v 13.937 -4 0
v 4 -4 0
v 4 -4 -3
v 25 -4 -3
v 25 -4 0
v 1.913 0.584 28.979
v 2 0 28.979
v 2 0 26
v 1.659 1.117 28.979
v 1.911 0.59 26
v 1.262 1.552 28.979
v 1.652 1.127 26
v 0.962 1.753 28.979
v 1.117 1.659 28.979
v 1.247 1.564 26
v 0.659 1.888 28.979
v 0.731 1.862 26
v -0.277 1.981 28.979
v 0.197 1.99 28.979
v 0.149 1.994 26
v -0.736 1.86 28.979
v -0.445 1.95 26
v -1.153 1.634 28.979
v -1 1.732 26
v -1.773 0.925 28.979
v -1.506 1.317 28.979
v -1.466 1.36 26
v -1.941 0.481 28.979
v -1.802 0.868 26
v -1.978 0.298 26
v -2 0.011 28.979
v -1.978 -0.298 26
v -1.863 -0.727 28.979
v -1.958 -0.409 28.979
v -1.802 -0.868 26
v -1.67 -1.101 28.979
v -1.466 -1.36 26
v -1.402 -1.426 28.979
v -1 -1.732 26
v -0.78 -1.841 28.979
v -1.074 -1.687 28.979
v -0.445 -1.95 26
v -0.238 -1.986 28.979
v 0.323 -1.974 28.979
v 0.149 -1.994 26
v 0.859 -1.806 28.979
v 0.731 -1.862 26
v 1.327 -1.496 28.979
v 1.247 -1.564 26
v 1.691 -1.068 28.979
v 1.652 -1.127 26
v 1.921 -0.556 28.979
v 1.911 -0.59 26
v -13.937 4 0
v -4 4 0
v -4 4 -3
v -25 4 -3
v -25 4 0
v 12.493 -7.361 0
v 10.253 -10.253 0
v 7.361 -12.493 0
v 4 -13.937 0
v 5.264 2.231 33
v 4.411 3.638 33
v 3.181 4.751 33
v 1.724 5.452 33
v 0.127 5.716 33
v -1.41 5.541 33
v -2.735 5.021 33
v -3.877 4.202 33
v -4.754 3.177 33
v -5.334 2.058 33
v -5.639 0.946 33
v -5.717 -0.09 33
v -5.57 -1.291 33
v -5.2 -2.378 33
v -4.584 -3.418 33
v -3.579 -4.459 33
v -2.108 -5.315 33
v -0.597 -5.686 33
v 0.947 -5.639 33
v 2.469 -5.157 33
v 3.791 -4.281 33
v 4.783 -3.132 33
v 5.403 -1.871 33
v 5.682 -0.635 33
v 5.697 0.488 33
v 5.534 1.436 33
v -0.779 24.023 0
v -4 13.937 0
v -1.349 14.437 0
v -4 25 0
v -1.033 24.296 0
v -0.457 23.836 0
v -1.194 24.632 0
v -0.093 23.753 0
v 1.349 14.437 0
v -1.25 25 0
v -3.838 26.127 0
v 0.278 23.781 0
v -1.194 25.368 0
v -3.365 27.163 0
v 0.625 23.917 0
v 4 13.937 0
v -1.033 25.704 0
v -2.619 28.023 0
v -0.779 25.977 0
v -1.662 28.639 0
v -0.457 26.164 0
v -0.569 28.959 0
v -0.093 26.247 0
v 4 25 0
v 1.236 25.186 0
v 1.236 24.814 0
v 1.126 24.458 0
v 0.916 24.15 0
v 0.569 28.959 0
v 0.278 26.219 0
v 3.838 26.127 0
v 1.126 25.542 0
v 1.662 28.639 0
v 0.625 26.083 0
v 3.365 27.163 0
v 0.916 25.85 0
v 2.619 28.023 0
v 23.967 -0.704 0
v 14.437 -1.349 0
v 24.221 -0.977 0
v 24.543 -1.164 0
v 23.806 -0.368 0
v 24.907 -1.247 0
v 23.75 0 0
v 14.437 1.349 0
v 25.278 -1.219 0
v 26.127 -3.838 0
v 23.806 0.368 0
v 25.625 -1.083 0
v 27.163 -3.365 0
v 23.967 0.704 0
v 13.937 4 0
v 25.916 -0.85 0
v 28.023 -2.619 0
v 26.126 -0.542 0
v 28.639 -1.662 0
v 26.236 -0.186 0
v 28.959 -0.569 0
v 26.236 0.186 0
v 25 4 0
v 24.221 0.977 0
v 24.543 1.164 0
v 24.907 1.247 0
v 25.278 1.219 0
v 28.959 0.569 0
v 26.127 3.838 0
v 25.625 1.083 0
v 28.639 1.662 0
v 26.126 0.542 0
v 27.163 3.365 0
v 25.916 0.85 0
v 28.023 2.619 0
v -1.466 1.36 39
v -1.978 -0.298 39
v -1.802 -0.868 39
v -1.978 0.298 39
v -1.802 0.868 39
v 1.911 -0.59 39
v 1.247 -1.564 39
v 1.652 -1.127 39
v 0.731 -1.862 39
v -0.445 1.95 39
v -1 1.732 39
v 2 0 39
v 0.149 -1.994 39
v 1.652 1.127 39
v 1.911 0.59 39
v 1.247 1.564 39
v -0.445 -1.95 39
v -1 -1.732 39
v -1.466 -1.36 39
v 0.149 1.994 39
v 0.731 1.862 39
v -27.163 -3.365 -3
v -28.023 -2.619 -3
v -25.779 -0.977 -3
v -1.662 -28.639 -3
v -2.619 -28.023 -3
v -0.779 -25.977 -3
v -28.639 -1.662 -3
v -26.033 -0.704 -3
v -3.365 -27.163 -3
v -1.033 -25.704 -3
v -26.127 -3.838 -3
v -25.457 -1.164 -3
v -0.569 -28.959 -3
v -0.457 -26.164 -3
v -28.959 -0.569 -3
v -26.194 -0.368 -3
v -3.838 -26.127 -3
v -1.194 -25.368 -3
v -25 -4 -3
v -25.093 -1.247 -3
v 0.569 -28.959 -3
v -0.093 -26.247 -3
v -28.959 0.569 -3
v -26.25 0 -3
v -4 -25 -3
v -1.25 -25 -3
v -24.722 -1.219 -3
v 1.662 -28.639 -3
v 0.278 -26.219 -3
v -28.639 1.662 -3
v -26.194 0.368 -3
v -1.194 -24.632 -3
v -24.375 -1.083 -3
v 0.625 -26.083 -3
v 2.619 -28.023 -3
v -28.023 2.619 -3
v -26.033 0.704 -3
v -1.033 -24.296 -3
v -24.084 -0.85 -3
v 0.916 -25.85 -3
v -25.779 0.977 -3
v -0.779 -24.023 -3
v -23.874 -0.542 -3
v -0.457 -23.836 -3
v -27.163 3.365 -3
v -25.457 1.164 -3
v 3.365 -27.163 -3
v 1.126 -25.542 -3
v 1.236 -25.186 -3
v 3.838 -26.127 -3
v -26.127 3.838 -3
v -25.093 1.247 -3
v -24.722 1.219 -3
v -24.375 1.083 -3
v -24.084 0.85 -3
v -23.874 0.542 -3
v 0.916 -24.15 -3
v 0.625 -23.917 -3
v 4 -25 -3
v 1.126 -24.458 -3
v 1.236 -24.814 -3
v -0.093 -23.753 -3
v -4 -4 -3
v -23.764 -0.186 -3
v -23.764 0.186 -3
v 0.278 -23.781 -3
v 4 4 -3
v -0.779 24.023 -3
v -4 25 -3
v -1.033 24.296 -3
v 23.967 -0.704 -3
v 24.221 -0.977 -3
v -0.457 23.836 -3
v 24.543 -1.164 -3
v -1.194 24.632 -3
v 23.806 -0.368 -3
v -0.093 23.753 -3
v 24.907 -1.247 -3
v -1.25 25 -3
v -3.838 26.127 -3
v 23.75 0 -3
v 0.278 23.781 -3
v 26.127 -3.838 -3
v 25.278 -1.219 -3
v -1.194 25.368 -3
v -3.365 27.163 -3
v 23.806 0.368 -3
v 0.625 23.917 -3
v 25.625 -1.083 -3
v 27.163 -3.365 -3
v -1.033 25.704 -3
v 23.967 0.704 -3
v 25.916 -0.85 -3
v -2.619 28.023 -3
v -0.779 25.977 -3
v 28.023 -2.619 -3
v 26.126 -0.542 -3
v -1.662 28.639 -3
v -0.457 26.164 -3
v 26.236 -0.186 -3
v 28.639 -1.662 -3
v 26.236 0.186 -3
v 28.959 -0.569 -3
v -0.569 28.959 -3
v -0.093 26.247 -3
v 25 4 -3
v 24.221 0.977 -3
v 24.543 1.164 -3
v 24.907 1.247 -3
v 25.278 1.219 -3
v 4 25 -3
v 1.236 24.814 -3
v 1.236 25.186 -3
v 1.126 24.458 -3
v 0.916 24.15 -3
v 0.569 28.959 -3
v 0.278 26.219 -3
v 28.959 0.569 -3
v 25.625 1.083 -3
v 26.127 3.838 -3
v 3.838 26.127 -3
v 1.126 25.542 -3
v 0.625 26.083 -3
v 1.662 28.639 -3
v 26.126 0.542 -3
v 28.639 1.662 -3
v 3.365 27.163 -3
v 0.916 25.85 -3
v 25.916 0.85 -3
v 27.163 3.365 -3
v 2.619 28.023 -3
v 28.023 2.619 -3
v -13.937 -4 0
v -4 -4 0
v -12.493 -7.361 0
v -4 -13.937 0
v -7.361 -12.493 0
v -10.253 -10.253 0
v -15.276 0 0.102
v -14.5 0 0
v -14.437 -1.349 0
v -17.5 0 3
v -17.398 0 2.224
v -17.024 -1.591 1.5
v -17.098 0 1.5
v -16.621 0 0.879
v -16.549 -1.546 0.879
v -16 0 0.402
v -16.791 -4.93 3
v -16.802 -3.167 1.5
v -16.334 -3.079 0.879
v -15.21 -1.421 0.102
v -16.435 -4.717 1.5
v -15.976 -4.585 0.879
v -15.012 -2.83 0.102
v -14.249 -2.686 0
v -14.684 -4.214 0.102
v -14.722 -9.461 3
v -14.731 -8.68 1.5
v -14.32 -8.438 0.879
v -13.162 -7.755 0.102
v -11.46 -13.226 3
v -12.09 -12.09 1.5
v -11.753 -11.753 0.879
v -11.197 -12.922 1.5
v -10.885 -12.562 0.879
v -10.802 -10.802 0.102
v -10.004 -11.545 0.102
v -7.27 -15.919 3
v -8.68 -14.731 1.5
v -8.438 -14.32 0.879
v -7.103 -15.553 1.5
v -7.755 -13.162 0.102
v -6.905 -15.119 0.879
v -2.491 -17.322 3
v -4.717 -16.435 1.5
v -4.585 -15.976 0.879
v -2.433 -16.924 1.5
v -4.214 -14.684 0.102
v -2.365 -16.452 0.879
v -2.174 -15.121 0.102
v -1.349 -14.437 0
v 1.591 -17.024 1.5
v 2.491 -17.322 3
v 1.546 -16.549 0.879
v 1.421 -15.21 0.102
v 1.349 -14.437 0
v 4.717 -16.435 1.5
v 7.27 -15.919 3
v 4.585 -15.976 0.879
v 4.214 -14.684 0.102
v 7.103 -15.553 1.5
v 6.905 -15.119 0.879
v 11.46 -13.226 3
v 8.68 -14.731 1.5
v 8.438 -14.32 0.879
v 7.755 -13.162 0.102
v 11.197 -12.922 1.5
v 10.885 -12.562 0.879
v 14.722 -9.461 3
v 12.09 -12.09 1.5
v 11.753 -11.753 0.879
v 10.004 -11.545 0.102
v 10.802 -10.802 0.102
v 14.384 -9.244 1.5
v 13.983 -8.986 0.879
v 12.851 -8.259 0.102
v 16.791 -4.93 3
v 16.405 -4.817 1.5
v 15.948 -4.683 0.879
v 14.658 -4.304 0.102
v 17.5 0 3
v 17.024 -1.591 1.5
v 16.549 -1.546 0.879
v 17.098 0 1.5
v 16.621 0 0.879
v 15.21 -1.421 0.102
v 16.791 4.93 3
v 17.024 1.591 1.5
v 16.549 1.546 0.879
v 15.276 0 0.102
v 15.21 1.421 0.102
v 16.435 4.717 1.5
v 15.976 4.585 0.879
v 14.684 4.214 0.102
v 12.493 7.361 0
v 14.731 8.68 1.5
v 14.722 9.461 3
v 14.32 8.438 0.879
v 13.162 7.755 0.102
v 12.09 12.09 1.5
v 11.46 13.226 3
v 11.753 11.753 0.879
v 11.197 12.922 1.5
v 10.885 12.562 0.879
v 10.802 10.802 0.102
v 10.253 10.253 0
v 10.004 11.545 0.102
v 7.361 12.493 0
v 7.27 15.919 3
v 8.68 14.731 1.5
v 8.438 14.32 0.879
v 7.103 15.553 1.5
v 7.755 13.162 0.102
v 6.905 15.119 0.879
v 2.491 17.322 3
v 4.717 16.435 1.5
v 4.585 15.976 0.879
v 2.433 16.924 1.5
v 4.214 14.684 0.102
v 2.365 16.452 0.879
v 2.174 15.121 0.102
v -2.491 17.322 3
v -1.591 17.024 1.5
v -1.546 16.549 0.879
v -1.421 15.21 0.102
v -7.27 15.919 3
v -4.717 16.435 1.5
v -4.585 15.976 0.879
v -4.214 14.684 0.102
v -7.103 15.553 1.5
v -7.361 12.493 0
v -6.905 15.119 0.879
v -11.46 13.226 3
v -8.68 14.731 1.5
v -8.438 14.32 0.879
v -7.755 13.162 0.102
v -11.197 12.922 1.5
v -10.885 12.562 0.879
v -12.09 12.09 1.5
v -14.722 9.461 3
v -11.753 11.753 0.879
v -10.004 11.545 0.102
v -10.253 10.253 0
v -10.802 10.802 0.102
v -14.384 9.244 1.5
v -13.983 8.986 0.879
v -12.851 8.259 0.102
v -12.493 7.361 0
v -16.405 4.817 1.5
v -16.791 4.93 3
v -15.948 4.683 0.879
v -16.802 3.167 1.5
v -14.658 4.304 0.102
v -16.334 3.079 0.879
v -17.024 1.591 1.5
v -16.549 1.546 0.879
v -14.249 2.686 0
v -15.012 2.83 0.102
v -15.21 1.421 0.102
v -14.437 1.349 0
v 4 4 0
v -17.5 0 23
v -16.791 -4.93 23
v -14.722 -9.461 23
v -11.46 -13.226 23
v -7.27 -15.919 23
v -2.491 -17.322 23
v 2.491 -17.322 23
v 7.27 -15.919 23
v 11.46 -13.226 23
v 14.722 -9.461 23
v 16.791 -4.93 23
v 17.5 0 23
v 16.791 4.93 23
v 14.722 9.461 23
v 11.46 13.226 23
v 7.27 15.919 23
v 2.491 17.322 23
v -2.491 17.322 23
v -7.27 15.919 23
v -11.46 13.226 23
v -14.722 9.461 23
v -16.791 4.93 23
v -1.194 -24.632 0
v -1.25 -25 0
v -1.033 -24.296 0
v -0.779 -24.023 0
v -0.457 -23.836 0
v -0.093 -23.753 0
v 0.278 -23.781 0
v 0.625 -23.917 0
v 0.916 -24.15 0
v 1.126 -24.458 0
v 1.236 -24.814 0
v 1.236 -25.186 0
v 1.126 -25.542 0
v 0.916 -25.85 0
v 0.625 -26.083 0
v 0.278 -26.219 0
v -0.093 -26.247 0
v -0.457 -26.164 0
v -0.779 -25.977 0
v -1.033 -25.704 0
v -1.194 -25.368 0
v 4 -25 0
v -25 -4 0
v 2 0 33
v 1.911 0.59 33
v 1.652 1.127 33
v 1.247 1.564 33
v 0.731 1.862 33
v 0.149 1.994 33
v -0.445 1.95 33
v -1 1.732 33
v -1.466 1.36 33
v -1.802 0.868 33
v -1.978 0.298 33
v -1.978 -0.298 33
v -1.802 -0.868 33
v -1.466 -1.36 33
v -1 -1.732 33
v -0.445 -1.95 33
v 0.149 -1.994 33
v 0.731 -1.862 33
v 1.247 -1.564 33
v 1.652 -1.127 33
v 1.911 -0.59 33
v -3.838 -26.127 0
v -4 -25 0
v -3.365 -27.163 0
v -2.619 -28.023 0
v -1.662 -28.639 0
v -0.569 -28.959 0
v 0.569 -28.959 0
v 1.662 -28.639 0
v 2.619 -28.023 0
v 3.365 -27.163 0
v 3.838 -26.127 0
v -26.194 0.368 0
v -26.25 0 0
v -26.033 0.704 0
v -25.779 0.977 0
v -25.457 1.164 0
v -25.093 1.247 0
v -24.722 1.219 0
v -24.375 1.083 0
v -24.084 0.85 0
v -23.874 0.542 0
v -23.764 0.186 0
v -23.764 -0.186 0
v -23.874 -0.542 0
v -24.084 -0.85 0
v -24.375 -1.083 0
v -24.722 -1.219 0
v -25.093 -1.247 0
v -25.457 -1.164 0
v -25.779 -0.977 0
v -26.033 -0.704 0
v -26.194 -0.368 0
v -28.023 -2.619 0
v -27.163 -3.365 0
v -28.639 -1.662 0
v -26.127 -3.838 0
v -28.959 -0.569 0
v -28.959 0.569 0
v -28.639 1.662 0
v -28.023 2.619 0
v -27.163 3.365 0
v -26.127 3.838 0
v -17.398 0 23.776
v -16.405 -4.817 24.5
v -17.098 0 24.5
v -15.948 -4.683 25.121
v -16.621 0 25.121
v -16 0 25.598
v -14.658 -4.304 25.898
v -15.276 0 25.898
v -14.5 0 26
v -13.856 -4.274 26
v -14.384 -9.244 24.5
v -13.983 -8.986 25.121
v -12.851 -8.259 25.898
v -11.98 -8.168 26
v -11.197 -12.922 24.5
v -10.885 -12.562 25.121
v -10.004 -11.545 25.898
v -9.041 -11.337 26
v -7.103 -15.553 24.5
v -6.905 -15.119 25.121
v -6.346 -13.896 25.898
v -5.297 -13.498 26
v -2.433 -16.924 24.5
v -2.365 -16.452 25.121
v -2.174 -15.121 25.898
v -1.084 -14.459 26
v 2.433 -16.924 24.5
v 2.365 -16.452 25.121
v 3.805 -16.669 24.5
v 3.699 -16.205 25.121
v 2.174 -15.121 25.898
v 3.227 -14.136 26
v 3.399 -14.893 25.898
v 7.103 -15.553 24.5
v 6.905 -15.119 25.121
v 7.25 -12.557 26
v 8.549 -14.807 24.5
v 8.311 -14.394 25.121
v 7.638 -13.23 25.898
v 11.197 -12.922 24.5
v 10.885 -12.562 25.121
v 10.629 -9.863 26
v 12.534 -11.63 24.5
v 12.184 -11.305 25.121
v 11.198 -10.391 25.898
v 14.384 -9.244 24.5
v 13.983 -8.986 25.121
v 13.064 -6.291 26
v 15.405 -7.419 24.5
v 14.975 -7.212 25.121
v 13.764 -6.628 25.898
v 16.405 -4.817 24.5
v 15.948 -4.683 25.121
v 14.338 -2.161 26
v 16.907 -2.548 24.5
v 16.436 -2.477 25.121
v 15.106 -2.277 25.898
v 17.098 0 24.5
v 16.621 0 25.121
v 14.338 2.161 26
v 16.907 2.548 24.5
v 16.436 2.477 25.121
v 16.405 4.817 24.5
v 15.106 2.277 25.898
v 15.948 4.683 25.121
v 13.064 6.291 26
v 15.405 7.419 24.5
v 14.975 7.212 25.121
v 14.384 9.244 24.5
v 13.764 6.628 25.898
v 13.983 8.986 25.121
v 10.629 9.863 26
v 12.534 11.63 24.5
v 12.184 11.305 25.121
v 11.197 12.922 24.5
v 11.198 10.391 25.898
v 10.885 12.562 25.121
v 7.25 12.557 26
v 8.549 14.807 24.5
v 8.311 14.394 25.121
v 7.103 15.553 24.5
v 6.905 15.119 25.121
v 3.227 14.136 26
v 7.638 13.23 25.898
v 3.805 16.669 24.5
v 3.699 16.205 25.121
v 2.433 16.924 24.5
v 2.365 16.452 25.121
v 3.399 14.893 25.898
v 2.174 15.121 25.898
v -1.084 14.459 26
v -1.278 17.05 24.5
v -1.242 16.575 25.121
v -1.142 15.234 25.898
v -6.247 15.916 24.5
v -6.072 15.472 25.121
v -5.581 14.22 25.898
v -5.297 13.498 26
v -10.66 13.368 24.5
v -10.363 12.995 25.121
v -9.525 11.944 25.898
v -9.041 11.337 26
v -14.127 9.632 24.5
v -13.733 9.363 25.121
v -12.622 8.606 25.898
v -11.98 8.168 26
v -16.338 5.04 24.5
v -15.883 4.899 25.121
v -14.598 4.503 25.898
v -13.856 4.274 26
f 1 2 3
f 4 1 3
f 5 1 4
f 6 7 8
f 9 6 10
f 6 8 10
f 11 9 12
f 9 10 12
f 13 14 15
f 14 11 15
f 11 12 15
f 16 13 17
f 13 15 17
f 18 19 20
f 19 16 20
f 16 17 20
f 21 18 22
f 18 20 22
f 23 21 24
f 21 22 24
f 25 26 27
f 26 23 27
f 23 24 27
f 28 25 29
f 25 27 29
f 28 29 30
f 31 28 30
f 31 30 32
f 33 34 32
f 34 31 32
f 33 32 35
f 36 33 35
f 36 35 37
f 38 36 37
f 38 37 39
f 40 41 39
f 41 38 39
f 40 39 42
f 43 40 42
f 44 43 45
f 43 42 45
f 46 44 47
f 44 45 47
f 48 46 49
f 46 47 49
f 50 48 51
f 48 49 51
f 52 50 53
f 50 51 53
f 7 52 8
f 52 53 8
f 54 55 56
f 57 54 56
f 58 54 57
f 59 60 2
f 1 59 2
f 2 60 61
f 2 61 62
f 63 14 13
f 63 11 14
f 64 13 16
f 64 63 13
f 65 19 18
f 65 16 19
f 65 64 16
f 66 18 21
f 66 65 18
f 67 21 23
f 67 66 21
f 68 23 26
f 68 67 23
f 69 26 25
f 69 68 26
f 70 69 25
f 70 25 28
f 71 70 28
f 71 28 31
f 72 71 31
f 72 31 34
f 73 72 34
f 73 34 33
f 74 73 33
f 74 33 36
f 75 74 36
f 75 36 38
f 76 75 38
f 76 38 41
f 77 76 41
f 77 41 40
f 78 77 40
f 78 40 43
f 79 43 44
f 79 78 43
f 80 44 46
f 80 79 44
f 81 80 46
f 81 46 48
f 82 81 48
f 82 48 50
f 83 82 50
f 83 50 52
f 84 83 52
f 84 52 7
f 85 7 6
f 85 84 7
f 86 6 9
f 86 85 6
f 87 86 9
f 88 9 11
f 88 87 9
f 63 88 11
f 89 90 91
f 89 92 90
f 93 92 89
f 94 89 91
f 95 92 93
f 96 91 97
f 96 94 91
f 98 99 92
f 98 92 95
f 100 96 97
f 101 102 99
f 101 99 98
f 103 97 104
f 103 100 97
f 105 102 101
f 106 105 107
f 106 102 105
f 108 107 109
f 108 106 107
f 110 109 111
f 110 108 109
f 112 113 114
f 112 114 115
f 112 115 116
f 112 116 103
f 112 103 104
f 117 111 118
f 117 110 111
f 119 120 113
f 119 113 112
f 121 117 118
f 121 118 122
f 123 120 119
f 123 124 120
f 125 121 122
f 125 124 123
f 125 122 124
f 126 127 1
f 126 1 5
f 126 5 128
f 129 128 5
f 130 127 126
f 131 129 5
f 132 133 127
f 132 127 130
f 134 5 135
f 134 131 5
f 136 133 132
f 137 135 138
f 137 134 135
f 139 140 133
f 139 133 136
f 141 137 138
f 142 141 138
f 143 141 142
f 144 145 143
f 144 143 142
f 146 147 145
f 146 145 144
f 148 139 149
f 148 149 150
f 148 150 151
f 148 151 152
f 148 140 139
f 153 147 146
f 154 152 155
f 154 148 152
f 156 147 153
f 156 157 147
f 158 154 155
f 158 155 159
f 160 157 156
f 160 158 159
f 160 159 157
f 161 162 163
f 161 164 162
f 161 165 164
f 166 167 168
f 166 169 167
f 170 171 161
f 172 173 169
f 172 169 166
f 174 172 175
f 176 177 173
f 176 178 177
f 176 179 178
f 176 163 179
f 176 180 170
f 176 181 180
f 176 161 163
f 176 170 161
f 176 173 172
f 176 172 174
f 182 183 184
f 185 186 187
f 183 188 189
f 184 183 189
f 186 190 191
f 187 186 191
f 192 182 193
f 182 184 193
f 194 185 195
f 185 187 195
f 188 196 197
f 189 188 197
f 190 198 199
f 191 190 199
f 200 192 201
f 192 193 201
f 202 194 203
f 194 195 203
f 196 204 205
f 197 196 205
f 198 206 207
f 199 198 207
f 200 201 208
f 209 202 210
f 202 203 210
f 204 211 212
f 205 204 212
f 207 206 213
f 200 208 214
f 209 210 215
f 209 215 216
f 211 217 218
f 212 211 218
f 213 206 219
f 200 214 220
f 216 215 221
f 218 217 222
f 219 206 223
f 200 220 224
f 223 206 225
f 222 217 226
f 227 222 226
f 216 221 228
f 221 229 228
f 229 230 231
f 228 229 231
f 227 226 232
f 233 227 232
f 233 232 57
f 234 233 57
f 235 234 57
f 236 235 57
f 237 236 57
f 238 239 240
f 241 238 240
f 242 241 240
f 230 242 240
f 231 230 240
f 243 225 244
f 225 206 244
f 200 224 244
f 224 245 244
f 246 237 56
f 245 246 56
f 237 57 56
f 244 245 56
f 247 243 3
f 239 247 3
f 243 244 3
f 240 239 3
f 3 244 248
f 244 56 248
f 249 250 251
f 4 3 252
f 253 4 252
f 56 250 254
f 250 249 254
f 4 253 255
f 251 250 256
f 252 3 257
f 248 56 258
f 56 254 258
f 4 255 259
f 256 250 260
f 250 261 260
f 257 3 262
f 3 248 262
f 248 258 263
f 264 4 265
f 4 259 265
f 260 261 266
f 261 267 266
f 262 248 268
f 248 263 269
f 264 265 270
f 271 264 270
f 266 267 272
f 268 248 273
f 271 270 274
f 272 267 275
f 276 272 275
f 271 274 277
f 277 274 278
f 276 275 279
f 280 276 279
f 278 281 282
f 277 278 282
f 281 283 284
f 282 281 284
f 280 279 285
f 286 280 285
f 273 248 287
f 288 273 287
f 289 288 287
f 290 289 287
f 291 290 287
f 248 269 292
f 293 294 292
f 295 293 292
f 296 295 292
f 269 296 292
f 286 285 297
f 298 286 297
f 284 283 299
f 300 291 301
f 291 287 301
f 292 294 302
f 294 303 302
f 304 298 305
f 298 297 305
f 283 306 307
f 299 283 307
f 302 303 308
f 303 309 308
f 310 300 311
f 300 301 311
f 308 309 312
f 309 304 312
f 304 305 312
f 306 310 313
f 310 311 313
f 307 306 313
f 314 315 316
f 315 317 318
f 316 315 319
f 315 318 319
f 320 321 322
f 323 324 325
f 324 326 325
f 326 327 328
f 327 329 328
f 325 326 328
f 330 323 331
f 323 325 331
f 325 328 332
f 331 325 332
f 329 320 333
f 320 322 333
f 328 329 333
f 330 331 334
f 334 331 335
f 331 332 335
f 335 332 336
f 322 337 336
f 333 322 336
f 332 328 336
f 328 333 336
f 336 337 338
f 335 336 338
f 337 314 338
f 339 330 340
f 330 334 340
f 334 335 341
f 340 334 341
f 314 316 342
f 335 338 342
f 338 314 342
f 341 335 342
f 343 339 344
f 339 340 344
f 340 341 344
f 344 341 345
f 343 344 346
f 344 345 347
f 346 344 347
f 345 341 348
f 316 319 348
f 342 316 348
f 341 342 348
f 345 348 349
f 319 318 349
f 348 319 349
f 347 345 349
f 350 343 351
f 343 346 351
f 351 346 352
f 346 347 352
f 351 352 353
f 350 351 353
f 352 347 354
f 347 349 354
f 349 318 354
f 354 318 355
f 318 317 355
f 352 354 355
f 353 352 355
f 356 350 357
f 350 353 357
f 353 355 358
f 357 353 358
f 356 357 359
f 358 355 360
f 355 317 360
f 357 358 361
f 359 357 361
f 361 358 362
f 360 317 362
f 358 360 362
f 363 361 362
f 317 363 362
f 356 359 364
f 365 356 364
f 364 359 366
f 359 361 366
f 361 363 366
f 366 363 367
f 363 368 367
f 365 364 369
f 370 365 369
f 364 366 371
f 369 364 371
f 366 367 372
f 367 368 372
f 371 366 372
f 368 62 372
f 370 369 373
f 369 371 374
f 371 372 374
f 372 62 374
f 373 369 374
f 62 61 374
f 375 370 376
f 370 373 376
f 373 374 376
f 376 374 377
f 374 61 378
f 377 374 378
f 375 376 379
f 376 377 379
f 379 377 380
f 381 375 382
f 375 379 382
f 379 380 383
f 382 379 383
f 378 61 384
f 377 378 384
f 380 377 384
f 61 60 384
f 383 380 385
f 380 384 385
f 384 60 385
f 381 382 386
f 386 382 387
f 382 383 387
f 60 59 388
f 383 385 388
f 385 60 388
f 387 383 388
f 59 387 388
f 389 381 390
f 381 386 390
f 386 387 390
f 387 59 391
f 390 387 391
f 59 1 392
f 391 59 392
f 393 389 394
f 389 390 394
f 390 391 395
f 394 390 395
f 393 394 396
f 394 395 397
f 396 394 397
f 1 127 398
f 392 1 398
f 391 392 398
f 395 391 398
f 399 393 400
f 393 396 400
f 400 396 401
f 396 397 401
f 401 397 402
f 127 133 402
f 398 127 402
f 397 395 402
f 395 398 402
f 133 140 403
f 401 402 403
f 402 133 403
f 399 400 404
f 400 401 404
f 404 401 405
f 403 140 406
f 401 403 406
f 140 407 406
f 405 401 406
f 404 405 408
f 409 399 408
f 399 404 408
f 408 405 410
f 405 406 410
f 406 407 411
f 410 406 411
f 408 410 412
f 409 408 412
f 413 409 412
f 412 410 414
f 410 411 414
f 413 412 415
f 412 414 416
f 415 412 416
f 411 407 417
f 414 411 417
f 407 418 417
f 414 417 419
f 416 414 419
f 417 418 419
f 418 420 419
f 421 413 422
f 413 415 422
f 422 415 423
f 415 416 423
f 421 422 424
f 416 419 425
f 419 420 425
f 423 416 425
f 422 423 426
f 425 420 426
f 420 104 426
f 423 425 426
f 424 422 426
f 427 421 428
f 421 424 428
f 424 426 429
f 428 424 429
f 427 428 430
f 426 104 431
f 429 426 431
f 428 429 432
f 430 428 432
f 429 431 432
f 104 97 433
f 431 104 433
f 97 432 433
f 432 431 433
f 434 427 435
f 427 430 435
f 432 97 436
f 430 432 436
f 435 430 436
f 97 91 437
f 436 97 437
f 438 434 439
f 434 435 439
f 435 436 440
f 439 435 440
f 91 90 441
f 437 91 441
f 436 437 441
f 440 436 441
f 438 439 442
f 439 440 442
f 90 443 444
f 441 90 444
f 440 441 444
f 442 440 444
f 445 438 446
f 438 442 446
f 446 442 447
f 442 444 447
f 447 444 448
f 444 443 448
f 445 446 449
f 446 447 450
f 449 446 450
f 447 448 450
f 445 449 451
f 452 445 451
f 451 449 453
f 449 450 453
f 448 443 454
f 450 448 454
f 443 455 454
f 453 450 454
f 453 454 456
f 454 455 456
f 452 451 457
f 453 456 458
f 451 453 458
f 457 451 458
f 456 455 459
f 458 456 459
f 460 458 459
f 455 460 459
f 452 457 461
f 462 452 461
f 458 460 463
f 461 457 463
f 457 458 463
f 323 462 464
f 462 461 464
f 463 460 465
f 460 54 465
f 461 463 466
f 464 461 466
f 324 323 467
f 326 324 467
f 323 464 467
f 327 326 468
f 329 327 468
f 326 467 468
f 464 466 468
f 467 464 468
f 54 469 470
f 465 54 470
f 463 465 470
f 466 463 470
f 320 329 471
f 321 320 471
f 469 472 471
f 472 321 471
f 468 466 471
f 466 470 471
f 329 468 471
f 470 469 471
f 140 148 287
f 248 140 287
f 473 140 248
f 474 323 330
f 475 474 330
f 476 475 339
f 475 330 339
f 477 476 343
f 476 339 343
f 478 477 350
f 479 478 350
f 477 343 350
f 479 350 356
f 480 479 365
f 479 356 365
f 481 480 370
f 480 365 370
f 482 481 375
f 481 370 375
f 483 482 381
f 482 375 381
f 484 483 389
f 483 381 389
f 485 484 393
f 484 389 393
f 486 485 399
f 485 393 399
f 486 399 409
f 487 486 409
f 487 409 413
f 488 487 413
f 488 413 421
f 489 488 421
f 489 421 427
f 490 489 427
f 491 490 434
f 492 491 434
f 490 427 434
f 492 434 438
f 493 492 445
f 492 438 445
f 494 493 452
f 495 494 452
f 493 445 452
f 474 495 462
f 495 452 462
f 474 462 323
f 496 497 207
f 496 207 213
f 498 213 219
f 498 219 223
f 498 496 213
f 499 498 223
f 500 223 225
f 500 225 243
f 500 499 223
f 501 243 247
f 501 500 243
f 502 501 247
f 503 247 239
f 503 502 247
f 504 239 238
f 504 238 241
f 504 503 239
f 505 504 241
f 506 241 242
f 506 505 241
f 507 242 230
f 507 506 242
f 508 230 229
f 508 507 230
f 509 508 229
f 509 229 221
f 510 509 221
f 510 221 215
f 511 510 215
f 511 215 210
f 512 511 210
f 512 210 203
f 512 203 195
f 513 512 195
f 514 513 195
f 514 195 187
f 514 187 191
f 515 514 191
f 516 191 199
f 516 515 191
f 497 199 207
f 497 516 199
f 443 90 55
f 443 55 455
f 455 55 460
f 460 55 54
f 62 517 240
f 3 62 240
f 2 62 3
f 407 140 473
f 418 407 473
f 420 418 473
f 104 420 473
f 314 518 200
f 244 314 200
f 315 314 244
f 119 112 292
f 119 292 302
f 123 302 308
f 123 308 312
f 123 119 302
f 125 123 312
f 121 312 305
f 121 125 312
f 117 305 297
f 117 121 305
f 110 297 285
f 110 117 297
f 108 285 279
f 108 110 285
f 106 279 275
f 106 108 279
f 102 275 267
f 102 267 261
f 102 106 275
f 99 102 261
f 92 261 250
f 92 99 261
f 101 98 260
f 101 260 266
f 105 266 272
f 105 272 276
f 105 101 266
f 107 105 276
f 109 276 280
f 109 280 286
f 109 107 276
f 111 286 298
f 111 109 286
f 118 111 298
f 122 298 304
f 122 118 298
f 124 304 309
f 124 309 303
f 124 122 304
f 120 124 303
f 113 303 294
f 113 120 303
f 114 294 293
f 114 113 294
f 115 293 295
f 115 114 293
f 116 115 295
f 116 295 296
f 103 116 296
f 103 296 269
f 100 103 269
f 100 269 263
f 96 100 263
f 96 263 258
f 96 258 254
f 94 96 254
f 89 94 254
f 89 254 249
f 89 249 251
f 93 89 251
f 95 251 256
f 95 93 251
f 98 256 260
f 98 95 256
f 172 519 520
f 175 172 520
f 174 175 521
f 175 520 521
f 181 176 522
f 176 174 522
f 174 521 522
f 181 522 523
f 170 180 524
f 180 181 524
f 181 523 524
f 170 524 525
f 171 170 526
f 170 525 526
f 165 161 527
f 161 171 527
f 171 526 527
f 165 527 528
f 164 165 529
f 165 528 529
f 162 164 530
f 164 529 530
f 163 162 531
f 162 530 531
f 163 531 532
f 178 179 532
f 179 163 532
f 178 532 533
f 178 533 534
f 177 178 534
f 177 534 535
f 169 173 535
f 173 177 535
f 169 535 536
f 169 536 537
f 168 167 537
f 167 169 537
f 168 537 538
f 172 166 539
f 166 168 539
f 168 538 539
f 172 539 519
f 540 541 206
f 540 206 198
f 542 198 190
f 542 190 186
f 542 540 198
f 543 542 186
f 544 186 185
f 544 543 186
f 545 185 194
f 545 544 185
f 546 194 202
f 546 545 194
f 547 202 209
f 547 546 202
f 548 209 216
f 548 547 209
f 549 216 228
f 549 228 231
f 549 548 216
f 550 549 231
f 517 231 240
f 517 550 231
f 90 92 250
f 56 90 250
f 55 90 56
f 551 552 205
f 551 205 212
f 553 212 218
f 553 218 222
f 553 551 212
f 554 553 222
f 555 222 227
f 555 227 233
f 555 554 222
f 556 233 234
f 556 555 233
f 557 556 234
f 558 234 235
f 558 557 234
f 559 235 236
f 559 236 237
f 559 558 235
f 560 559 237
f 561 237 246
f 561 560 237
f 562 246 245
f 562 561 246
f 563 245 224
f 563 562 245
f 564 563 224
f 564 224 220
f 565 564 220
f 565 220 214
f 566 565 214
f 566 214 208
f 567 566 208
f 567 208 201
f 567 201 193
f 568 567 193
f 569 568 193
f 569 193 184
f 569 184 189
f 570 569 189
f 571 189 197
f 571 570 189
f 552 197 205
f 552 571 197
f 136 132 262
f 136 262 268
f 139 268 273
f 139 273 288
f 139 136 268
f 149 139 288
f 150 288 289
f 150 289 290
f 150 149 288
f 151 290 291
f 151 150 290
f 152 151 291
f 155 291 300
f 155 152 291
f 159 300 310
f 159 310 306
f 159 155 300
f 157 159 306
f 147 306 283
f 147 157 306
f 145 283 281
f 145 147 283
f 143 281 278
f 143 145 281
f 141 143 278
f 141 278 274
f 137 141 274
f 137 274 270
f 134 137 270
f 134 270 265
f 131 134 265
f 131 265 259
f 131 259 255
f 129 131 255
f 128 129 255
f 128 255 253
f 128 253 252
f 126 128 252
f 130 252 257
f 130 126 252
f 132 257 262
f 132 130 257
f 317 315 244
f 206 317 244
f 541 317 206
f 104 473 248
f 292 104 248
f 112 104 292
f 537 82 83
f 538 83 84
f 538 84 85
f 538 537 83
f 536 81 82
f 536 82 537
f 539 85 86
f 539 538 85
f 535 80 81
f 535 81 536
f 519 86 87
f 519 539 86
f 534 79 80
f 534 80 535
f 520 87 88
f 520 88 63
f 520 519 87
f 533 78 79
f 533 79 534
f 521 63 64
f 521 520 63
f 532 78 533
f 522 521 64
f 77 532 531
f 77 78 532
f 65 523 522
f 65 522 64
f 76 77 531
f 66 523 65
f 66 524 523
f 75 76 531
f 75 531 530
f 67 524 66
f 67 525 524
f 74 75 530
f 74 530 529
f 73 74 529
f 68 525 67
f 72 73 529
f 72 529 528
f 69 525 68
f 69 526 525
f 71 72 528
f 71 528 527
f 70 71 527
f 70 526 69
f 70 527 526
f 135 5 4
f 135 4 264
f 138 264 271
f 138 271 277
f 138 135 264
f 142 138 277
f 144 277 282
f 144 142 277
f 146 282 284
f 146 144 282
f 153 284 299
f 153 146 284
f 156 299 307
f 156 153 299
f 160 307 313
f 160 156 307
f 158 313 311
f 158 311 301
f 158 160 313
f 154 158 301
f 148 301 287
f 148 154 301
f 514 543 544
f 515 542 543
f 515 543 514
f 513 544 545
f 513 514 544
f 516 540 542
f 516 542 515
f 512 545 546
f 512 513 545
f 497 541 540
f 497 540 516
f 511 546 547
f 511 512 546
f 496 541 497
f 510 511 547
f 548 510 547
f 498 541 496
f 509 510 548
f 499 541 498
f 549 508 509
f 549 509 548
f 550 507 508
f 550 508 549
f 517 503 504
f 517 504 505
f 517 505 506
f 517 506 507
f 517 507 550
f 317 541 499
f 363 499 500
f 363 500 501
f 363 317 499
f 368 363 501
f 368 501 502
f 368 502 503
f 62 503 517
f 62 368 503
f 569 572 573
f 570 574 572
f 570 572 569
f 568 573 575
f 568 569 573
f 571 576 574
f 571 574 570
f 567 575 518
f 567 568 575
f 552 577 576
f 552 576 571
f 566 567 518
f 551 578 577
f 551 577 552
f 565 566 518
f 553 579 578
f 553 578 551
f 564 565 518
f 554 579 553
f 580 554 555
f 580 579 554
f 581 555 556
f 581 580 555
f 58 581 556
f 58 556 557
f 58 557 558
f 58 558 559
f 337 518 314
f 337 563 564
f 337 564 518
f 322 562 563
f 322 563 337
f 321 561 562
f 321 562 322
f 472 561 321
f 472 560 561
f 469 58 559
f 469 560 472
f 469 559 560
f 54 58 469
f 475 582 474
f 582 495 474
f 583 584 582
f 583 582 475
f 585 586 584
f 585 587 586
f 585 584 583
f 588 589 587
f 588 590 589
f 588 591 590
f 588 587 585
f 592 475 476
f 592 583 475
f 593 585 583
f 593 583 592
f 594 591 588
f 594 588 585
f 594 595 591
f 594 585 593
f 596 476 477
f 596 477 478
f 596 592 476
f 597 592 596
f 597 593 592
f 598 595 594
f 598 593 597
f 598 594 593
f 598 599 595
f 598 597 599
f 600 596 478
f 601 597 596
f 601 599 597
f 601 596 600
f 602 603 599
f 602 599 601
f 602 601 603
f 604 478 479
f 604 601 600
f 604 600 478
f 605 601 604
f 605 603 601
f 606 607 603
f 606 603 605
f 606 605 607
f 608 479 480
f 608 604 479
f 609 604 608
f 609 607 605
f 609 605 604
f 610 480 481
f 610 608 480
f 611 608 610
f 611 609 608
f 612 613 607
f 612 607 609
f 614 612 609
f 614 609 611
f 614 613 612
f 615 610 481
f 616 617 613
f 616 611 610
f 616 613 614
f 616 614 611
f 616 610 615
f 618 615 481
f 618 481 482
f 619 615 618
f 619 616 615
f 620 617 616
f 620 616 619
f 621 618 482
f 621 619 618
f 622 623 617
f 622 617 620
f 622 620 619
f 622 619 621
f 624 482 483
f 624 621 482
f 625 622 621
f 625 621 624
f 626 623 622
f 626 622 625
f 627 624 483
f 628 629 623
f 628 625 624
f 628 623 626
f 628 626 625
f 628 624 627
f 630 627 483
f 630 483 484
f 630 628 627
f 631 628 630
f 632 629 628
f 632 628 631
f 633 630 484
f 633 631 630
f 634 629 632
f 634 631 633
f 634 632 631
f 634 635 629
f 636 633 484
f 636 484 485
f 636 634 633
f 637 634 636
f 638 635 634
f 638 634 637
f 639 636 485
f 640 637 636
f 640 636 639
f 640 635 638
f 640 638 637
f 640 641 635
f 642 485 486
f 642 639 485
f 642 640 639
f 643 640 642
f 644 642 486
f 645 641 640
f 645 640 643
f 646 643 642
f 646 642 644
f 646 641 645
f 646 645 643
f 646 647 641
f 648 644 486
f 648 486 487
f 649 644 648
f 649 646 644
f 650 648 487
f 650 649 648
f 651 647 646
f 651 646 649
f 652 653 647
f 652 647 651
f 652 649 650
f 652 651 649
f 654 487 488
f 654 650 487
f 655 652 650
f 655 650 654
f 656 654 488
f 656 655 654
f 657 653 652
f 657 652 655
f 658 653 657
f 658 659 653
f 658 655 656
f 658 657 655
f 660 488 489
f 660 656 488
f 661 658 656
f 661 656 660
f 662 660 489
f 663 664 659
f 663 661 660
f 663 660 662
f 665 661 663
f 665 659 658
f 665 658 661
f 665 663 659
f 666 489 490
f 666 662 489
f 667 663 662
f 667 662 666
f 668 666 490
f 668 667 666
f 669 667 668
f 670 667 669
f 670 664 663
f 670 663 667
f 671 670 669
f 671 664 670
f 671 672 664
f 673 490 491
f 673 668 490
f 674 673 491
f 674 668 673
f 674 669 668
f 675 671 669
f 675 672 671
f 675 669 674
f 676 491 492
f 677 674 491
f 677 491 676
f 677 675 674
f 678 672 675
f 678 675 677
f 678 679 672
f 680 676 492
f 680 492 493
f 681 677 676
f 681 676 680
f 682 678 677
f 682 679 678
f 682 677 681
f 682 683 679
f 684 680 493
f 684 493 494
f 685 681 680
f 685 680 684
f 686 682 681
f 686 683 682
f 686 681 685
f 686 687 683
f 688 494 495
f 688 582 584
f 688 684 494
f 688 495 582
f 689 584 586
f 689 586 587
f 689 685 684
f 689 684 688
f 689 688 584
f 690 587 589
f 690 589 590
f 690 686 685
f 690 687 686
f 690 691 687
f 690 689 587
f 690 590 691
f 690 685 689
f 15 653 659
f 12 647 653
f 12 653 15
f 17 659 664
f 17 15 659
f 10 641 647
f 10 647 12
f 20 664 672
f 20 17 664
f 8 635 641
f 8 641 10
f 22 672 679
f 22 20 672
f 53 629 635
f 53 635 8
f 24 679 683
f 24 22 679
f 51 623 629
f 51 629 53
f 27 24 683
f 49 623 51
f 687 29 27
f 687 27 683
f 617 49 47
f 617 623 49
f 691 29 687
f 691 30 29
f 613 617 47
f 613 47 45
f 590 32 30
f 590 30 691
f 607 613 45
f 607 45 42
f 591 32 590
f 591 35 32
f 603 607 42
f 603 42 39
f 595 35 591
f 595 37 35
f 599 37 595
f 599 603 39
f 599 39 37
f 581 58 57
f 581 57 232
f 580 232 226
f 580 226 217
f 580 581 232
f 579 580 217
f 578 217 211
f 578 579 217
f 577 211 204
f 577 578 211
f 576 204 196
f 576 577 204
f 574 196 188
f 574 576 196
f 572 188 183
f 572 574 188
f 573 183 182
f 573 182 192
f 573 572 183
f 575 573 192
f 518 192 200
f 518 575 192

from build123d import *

# Parameters (mm, degrees)
ESQUISSE1_R             = 17.5
BOSS_EXTRU_1_DEPTH      = 26
CONG_1_R                = 3
ESQUISSE2_R             = 2
BOSS_EXTRU_2_DEPTH      = 20
ESQUISSE3_R             = 2.5
BOSS_EXTRU_3_DEPTH      = 5
CONG_5_R                = 1
ESQUISSE6_R             = 4.037593864
ENL_V_MAT_EXTRU_1_DEPTH = 7
ESQUISSE7_R             = 1.25
BOSS_EXTRU_4_DEPTH      = 3
ESQUISSE9_R             = 1.25
BOSS_EXTRU_5_DEPTH      = 3
ESQUISSE10_R            = 1.25
BOSS_EXTRU_6_DEPTH      = 3
ESQUISSE11_R            = 1.25
BOSS_EXTRU_7_DEPTH      = 3
ESQUISSE12_R            = 7.076094554
ENL_V_MAT_EXTRU_3_DEPTH = 32


with BuildPart() as part:
    # Esquisse1 → Boss.-Extru.1 (new body)
    with BuildSketch(Plane.XY):
        with Locations(Location((0, 0, 0), (0, 0, 180))):
            Circle(ESQUISSE1_R)
    extrude(amount=BOSS_EXTRU_1_DEPTH)

    # Congé1
    cong_1_edges = [part.edges().sort_by_distance(p)[0] for p in [
        (17.5, 0, 0),
        (17.5, 0, 26),
    ]]
    fillet(cong_1_edges, radius=CONG_1_R)

    # Esquisse2 → Boss.-Extru.2 (add)
    with BuildSketch(Plane.XY.offset(26)):
        Circle(ESQUISSE2_R)
    extrude(amount=BOSS_EXTRU_2_DEPTH)

    # Esquisse3 → Boss.-Extru.3 (add)
    with BuildSketch(Plane(origin=(0, 0, 0), x_dir=(-1, 0, 0), z_dir=(0, 0, -1))):
        with Locations(Location((0, 0, 0), (0, 0, 180))):
            Circle(ESQUISSE3_R)
    extrude(amount=BOSS_EXTRU_3_DEPTH)

    # Congé5
    cong_5_edges = [part.edges().sort_by_distance(p)[0] for p in [
        (-2.5, 0, -5),
    ]]
    fillet(cong_5_edges, radius=CONG_5_R)

    # Lissage1: read off the stored shape, not the designer's step
    # Lissage1: loft between two sections, ruled curve by curve
    lissage1_from = [
        Edge.make_bspline([(-1.703307527, 1.048209649, 26), (-3.799726825, -2.358405406, 26), (-0.39311177, -4.454824703, 26), (1.703307527, -1.048209649, 26), (3.799726825, 2.358405406, 26), (0.39311177, 4.454824703, 26), (-1.703307527, 1.048209649, 26)], [0, 0, 0, 0, 0.5, 0.5, 0.5, 1, 1, 1, 1], 3, [1, 0.333333333, 0.333333333, 1, 0.333333333, 0.333333333, 1]),
    ]
    lissage1_to = [
        Edge.make_bspline([(5.264402681, 2.231137224, 33), (0.802128233, 12.759942587, 33), (-9.72667713, 8.297668139, 33), (-5.264402681, -2.231137224, 33), (-0.802128233, -12.759942587, 33), (9.72667713, -8.297668139, 33), (5.264402681, 2.231137224, 33)], [0, 0, 0, 0, 0.5, 0.5, 0.5, 1, 1, 1, 1], 3, [1, 0.333333333, 0.333333333, 1, 0.333333333, 0.333333333, 1]),
    ]
    lissage1 = Solid(Shell([*[Face.make_surface_from_curves(lissage1_from[k], lissage1_to[k]) for k in range(1)], Face(Wire(lissage1_from)), Face(Wire(lissage1_to))]))
    add(lissage1)

    # Esquisse6 → Enlèv. mat.-Extru.1 (cut)
    with BuildSketch(Plane.XY.offset(46)):
        Circle(ESQUISSE6_R)
    extrude(amount=-ENL_V_MAT_EXTRU_1_DEPTH, mode=Mode.SUBTRACT)

    # Esquisse7 → Boss.-Extru.4 (add)
    with BuildSketch(Plane(origin=(0, 0, 0), x_dir=(-1, 0, 0), z_dir=(0, 0, -1))):
        with BuildLine():
            Line((4, 0), (4, -25))
            ThreePointArc((4, -25), (0, -29), (-4, -25))
            Line((-4, -25), (-4, 0))
            ThreePointArc((-4, 0), (0, 4), (4, 0))
        make_face()
        with Locations((0, -25)):
            Circle(ESQUISSE7_R, mode=Mode.SUBTRACT)
    extrude(amount=BOSS_EXTRU_4_DEPTH)

    # Esquisse9 → Boss.-Extru.5 (add)
    with BuildSketch(Plane(origin=(0, 0, 0), x_dir=(-1, 0, 0), z_dir=(0, 0, -1))):
        with BuildLine():
            Line((-4, 0), (-4, 25))
            ThreePointArc((-4, 25), (0, 29), (4, 25))
            Line((4, 25), (4, 0))
            ThreePointArc((4, 0), (0, -4), (-4, 0))
        make_face()
        with Locations((0, 25)):
            Circle(ESQUISSE9_R, mode=Mode.SUBTRACT)
    extrude(amount=BOSS_EXTRU_5_DEPTH)

    # Esquisse10 → Boss.-Extru.6 (add)
    with BuildSketch(Plane(origin=(0, 0, 0), x_dir=(-1, 0, 0), z_dir=(0, 0, -1))):
        with BuildLine():
            Line((0, -4), (-25, -4))
            ThreePointArc((-25, -4), (-29, 0), (-25, 4))
            Line((-25, 4), (0, 4))
            ThreePointArc((0, 4), (4, 0), (0, -4))
        make_face()
        with Locations((-25, 0)):
            Circle(ESQUISSE10_R, mode=Mode.SUBTRACT)
    extrude(amount=BOSS_EXTRU_6_DEPTH)

    # Esquisse11 → Boss.-Extru.7 (add)
    with BuildSketch(Plane(origin=(0, 0, 0), x_dir=(-1, 0, 0), z_dir=(0, 0, -1))):
        with BuildLine():
            Line((0, 4), (25, 4))
            ThreePointArc((25, 4), (29, 0), (25, -4))
            Line((25, -4), (0, -4))
            ThreePointArc((0, -4), (-4, 0), (0, 4))
        make_face()
        with Locations((25, 0)):
            Circle(ESQUISSE11_R, mode=Mode.SUBTRACT)
    extrude(amount=BOSS_EXTRU_7_DEPTH)

    # Esquisse12 → Enlèv. mat.-Extru.3 (cut)
    with BuildSketch(Plane(origin=(0, 0, -3), x_dir=(-1, 0, 0), z_dir=(0, 0, -1))):
        Circle(ESQUISSE12_R)
    extrude(amount=ENL_V_MAT_EXTRU_3_DEPTH, mode=Mode.SUBTRACT)


solid = part.part
